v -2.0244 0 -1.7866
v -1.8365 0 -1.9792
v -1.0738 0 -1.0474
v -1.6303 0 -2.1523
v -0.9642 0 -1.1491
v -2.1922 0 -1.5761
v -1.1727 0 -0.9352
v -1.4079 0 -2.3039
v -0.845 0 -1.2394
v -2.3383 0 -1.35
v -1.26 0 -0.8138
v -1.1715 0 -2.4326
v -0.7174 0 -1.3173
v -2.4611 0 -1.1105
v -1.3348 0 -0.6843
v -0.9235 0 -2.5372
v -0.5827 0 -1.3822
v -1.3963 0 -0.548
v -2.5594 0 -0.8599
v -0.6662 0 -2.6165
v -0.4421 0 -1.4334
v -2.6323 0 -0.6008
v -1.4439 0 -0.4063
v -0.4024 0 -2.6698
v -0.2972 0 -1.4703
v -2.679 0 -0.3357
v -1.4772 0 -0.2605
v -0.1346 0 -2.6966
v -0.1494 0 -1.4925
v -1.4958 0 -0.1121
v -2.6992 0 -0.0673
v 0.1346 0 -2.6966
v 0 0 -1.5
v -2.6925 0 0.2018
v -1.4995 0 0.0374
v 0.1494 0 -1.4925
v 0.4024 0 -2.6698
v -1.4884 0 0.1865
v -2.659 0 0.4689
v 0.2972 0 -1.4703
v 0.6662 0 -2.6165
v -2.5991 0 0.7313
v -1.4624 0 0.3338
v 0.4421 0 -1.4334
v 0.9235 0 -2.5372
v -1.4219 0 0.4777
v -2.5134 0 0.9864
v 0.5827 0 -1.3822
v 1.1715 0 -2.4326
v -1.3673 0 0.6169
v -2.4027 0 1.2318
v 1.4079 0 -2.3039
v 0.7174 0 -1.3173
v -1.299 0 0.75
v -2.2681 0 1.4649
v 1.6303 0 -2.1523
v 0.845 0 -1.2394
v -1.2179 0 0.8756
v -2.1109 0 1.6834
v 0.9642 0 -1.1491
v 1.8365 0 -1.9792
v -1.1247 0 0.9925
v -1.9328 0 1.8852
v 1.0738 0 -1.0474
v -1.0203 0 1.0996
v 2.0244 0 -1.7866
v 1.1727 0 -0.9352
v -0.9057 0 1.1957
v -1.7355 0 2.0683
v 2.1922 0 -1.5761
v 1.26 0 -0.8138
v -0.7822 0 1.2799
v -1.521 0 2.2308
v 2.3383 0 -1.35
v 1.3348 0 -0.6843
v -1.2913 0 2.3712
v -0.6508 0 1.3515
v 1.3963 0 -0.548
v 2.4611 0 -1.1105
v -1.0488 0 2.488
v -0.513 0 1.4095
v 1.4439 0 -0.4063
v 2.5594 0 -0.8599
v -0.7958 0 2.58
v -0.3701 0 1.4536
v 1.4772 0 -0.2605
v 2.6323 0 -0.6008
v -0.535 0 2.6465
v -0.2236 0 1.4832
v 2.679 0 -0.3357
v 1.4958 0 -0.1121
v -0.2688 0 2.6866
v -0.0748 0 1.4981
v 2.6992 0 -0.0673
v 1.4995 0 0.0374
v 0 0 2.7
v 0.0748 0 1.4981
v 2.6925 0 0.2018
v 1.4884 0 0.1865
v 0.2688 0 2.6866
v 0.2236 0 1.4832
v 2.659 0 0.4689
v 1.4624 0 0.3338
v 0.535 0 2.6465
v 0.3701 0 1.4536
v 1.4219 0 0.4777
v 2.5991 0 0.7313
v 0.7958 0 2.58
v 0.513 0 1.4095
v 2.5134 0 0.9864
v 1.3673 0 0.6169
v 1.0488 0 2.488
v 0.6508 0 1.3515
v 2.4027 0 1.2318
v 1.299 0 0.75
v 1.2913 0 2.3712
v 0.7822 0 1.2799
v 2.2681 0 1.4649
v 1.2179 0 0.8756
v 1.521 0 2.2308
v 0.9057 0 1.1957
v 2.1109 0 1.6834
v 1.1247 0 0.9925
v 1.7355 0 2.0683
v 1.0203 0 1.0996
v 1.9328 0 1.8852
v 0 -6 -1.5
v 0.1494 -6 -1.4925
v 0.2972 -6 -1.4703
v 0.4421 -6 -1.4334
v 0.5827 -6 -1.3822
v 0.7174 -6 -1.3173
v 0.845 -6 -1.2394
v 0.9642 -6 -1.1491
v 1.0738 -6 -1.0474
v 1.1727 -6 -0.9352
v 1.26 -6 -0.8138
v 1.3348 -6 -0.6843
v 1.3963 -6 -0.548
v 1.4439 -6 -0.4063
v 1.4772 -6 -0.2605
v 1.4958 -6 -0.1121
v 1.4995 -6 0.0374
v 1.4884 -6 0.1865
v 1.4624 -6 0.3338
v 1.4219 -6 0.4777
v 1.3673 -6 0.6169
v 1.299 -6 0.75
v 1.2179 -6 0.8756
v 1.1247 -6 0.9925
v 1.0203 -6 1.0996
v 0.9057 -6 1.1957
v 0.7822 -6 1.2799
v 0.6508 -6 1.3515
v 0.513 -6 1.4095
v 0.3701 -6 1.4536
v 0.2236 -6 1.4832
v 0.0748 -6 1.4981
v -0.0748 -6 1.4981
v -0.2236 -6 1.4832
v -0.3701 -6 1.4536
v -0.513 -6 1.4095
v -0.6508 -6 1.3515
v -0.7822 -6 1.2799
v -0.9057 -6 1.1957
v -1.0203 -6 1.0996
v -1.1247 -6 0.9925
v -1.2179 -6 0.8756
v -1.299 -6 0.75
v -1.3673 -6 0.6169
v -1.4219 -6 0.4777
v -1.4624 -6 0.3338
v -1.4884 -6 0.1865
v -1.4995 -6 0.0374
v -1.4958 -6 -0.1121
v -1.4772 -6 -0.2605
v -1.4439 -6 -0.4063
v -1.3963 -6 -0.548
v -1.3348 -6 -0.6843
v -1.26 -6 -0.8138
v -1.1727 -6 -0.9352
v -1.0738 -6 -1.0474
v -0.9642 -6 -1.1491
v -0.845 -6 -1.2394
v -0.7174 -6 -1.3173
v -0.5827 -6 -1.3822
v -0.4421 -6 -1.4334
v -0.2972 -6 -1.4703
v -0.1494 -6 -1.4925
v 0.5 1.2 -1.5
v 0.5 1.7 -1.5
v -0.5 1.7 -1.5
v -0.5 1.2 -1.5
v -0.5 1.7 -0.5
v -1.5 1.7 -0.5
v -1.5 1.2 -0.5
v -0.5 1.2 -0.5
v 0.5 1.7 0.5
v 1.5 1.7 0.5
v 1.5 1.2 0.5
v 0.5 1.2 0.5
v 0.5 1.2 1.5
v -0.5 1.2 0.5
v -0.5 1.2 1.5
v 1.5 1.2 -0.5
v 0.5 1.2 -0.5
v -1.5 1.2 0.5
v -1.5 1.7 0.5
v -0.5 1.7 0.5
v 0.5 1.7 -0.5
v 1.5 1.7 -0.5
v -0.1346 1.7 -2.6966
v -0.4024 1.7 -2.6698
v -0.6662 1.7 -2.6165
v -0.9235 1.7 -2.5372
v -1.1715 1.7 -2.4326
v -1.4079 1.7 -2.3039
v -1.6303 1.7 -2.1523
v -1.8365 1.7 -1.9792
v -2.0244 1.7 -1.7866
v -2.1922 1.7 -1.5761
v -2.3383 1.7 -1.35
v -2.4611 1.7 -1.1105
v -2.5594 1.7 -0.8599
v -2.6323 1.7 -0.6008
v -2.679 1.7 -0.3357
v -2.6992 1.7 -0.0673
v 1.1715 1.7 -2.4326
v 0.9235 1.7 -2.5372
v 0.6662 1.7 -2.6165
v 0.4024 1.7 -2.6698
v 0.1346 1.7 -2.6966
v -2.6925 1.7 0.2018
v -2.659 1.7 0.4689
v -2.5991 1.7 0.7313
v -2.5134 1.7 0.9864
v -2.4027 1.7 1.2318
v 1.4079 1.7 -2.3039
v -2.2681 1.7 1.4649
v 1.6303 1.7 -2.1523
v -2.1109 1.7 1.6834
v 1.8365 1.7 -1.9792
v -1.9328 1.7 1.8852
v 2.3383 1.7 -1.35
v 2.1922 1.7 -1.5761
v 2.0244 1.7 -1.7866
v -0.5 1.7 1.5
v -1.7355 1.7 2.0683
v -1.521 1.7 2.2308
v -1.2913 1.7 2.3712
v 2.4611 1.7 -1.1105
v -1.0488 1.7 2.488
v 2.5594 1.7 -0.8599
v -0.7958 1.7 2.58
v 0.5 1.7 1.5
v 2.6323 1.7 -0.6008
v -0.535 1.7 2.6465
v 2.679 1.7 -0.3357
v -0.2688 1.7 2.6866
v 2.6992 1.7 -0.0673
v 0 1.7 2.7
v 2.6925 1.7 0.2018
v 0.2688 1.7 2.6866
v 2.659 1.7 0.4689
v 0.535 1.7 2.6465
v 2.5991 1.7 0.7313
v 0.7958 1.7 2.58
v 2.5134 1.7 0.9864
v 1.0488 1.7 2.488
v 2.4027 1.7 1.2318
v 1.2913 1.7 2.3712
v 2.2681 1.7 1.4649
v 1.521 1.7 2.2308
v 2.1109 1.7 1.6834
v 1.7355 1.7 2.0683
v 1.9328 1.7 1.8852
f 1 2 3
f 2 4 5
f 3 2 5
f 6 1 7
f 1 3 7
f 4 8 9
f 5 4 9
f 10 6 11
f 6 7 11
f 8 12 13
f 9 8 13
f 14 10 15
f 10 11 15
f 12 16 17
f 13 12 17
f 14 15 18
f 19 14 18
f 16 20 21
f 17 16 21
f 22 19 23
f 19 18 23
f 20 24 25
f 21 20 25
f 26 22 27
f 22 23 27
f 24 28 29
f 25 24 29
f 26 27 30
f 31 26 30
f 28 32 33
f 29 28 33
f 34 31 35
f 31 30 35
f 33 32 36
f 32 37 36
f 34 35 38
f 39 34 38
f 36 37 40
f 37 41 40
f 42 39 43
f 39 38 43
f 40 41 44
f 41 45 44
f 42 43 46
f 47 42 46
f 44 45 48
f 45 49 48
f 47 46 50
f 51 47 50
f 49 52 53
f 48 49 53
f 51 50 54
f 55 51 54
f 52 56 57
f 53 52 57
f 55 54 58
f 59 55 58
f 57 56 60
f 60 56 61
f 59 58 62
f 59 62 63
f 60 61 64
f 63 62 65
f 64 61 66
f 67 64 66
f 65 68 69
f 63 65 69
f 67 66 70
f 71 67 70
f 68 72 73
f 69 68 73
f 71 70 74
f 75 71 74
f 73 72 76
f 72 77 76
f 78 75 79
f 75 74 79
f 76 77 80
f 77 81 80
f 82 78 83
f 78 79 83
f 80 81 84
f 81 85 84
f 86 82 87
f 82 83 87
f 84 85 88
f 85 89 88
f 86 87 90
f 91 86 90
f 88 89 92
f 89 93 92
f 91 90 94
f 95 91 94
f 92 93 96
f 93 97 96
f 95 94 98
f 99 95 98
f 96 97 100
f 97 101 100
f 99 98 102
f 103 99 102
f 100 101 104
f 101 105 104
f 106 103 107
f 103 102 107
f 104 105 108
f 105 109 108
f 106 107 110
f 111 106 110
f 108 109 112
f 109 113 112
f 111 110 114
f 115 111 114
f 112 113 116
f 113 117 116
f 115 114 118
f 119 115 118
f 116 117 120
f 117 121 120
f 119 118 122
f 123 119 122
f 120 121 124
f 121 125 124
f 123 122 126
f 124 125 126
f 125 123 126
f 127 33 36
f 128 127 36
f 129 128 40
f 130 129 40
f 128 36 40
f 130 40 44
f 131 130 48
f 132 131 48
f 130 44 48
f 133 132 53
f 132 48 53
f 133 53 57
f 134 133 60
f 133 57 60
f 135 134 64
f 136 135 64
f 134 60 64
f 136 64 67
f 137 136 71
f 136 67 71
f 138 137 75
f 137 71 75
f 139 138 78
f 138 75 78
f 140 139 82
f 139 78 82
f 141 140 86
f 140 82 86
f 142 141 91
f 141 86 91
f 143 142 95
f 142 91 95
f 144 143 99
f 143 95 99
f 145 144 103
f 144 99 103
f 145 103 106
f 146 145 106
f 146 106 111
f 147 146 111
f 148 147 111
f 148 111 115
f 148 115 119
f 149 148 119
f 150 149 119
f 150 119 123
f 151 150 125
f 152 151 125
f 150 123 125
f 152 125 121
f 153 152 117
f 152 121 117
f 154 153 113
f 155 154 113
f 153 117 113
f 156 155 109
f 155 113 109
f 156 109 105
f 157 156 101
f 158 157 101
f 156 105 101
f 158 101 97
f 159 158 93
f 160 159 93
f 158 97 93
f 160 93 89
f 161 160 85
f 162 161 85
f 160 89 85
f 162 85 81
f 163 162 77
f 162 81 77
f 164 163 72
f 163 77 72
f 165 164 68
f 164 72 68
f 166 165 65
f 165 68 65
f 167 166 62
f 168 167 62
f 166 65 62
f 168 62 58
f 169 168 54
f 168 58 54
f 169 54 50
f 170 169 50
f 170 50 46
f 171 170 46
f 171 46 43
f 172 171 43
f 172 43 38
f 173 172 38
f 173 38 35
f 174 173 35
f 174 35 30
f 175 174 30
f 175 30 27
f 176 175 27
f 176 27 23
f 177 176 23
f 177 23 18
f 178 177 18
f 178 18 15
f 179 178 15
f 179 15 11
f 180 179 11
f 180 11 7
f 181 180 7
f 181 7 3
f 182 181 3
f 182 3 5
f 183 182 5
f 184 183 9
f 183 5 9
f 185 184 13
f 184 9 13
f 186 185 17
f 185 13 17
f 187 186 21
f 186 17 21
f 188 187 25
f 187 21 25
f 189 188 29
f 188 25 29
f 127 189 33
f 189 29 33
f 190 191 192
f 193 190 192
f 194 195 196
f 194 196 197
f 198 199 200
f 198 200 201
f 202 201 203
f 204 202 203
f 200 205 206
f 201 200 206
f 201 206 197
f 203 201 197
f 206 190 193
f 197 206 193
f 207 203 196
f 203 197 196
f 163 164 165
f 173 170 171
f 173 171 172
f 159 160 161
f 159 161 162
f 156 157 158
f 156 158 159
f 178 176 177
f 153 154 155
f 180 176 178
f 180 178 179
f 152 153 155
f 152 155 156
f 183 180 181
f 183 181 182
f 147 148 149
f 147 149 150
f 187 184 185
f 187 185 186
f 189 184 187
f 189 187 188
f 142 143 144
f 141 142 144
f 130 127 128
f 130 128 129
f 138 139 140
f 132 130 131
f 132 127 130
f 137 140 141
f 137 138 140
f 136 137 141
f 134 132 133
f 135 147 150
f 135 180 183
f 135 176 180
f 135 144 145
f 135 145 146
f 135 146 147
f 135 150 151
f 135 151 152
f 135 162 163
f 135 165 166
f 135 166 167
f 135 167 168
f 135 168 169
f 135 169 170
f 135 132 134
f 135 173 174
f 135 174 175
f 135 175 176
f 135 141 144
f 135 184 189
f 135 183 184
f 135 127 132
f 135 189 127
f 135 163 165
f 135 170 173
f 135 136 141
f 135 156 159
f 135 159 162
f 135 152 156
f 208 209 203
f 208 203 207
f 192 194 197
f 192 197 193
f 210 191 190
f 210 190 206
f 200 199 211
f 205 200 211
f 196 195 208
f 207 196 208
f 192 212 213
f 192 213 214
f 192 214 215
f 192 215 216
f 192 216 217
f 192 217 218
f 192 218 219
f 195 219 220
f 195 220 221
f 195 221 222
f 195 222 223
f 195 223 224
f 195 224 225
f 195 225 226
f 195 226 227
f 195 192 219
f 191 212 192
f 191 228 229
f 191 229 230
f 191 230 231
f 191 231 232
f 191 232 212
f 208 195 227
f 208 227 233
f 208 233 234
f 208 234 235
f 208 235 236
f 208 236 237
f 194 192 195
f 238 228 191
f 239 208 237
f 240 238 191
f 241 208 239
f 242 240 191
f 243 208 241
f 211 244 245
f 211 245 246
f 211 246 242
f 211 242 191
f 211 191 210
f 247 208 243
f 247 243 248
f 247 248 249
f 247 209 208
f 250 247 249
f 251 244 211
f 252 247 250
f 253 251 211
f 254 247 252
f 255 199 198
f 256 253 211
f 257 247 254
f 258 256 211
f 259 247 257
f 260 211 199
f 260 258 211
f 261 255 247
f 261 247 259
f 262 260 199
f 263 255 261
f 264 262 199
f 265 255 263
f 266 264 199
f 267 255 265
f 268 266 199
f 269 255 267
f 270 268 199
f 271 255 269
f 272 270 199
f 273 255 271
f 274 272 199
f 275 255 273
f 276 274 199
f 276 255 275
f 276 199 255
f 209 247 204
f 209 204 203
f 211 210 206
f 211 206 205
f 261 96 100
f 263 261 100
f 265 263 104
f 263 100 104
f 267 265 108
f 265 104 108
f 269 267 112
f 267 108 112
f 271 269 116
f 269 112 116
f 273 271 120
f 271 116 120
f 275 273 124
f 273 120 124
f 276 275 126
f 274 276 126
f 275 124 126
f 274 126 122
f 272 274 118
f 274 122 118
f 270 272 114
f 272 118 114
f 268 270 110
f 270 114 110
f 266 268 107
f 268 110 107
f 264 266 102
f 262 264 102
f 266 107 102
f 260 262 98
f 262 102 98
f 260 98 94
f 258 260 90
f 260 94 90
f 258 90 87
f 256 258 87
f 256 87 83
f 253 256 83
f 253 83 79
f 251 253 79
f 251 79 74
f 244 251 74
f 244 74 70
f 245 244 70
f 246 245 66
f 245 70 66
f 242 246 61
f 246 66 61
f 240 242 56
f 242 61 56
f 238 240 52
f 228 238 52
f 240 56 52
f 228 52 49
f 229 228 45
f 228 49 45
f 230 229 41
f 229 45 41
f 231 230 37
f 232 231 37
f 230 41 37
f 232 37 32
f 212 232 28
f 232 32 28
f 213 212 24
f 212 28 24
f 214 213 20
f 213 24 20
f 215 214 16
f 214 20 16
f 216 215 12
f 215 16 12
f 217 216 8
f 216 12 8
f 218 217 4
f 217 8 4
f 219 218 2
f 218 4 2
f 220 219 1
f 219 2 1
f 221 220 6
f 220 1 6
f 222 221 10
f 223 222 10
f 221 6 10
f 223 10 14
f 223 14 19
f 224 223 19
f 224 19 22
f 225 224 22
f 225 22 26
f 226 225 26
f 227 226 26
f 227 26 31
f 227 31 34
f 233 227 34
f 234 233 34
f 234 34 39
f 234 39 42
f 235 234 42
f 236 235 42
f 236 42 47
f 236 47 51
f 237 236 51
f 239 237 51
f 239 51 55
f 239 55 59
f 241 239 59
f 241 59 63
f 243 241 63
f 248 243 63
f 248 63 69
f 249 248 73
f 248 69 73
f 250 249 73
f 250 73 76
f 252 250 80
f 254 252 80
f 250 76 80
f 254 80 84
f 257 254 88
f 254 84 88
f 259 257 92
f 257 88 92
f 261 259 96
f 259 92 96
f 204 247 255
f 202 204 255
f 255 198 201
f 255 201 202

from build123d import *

# Parameters (mm, degrees)
SKETCH_1_R          = 2.7
EXTRUDE_1_DEPTH     = 1.7
CUT_EXTRUDE_1_DEPTH = 0.5
SKETCH_3_R          = 1.5
EXTRUDE_2_DEPTH     = 6


with BuildPart() as part:
    # 草图1 → 凸台-拉伸1 (new body)
    with BuildSketch(Plane(origin=(0, 0, 0), x_dir=(1, 0, 0), z_dir=(0, 1, 0))):
        with Locations(Location((0, 0, 0), (0, 0, 270))):
            Circle(SKETCH_1_R)
    extrude(amount=EXTRUDE_1_DEPTH)

    # 草图2 → 切除-拉伸1 (cut)
    with BuildSketch(Plane(origin=(0, 1.7, 0), x_dir=(1, 0, 0), z_dir=(0, 1, 0))):
        Polygon((0, 1.5), (0.5, 1.5), (0.5, 0.5), (1.5, 0.5), (1.5, 0), (1.5, -0.5), (0.5, -0.5), (0.5, -1.5), (0, -1.5), (-0.5, -1.5), (-0.5, -0.5), (-1.5, -0.5), (-1.5, 0), (-1.5, 0.5), (-0.5, 0.5), (-0.5, 1.5), align=None)
    extrude(amount=-CUT_EXTRUDE_1_DEPTH, mode=Mode.SUBTRACT)

    # 草图3 → 凸台-拉伸2 (add)
    with BuildSketch(Plane.XZ):
        with Locations(Location((0, 0, 0), (0, 0, 270))):
            Circle(SKETCH_3_R)
    extrude(amount=EXTRUDE_2_DEPTH)


solid = part.part
